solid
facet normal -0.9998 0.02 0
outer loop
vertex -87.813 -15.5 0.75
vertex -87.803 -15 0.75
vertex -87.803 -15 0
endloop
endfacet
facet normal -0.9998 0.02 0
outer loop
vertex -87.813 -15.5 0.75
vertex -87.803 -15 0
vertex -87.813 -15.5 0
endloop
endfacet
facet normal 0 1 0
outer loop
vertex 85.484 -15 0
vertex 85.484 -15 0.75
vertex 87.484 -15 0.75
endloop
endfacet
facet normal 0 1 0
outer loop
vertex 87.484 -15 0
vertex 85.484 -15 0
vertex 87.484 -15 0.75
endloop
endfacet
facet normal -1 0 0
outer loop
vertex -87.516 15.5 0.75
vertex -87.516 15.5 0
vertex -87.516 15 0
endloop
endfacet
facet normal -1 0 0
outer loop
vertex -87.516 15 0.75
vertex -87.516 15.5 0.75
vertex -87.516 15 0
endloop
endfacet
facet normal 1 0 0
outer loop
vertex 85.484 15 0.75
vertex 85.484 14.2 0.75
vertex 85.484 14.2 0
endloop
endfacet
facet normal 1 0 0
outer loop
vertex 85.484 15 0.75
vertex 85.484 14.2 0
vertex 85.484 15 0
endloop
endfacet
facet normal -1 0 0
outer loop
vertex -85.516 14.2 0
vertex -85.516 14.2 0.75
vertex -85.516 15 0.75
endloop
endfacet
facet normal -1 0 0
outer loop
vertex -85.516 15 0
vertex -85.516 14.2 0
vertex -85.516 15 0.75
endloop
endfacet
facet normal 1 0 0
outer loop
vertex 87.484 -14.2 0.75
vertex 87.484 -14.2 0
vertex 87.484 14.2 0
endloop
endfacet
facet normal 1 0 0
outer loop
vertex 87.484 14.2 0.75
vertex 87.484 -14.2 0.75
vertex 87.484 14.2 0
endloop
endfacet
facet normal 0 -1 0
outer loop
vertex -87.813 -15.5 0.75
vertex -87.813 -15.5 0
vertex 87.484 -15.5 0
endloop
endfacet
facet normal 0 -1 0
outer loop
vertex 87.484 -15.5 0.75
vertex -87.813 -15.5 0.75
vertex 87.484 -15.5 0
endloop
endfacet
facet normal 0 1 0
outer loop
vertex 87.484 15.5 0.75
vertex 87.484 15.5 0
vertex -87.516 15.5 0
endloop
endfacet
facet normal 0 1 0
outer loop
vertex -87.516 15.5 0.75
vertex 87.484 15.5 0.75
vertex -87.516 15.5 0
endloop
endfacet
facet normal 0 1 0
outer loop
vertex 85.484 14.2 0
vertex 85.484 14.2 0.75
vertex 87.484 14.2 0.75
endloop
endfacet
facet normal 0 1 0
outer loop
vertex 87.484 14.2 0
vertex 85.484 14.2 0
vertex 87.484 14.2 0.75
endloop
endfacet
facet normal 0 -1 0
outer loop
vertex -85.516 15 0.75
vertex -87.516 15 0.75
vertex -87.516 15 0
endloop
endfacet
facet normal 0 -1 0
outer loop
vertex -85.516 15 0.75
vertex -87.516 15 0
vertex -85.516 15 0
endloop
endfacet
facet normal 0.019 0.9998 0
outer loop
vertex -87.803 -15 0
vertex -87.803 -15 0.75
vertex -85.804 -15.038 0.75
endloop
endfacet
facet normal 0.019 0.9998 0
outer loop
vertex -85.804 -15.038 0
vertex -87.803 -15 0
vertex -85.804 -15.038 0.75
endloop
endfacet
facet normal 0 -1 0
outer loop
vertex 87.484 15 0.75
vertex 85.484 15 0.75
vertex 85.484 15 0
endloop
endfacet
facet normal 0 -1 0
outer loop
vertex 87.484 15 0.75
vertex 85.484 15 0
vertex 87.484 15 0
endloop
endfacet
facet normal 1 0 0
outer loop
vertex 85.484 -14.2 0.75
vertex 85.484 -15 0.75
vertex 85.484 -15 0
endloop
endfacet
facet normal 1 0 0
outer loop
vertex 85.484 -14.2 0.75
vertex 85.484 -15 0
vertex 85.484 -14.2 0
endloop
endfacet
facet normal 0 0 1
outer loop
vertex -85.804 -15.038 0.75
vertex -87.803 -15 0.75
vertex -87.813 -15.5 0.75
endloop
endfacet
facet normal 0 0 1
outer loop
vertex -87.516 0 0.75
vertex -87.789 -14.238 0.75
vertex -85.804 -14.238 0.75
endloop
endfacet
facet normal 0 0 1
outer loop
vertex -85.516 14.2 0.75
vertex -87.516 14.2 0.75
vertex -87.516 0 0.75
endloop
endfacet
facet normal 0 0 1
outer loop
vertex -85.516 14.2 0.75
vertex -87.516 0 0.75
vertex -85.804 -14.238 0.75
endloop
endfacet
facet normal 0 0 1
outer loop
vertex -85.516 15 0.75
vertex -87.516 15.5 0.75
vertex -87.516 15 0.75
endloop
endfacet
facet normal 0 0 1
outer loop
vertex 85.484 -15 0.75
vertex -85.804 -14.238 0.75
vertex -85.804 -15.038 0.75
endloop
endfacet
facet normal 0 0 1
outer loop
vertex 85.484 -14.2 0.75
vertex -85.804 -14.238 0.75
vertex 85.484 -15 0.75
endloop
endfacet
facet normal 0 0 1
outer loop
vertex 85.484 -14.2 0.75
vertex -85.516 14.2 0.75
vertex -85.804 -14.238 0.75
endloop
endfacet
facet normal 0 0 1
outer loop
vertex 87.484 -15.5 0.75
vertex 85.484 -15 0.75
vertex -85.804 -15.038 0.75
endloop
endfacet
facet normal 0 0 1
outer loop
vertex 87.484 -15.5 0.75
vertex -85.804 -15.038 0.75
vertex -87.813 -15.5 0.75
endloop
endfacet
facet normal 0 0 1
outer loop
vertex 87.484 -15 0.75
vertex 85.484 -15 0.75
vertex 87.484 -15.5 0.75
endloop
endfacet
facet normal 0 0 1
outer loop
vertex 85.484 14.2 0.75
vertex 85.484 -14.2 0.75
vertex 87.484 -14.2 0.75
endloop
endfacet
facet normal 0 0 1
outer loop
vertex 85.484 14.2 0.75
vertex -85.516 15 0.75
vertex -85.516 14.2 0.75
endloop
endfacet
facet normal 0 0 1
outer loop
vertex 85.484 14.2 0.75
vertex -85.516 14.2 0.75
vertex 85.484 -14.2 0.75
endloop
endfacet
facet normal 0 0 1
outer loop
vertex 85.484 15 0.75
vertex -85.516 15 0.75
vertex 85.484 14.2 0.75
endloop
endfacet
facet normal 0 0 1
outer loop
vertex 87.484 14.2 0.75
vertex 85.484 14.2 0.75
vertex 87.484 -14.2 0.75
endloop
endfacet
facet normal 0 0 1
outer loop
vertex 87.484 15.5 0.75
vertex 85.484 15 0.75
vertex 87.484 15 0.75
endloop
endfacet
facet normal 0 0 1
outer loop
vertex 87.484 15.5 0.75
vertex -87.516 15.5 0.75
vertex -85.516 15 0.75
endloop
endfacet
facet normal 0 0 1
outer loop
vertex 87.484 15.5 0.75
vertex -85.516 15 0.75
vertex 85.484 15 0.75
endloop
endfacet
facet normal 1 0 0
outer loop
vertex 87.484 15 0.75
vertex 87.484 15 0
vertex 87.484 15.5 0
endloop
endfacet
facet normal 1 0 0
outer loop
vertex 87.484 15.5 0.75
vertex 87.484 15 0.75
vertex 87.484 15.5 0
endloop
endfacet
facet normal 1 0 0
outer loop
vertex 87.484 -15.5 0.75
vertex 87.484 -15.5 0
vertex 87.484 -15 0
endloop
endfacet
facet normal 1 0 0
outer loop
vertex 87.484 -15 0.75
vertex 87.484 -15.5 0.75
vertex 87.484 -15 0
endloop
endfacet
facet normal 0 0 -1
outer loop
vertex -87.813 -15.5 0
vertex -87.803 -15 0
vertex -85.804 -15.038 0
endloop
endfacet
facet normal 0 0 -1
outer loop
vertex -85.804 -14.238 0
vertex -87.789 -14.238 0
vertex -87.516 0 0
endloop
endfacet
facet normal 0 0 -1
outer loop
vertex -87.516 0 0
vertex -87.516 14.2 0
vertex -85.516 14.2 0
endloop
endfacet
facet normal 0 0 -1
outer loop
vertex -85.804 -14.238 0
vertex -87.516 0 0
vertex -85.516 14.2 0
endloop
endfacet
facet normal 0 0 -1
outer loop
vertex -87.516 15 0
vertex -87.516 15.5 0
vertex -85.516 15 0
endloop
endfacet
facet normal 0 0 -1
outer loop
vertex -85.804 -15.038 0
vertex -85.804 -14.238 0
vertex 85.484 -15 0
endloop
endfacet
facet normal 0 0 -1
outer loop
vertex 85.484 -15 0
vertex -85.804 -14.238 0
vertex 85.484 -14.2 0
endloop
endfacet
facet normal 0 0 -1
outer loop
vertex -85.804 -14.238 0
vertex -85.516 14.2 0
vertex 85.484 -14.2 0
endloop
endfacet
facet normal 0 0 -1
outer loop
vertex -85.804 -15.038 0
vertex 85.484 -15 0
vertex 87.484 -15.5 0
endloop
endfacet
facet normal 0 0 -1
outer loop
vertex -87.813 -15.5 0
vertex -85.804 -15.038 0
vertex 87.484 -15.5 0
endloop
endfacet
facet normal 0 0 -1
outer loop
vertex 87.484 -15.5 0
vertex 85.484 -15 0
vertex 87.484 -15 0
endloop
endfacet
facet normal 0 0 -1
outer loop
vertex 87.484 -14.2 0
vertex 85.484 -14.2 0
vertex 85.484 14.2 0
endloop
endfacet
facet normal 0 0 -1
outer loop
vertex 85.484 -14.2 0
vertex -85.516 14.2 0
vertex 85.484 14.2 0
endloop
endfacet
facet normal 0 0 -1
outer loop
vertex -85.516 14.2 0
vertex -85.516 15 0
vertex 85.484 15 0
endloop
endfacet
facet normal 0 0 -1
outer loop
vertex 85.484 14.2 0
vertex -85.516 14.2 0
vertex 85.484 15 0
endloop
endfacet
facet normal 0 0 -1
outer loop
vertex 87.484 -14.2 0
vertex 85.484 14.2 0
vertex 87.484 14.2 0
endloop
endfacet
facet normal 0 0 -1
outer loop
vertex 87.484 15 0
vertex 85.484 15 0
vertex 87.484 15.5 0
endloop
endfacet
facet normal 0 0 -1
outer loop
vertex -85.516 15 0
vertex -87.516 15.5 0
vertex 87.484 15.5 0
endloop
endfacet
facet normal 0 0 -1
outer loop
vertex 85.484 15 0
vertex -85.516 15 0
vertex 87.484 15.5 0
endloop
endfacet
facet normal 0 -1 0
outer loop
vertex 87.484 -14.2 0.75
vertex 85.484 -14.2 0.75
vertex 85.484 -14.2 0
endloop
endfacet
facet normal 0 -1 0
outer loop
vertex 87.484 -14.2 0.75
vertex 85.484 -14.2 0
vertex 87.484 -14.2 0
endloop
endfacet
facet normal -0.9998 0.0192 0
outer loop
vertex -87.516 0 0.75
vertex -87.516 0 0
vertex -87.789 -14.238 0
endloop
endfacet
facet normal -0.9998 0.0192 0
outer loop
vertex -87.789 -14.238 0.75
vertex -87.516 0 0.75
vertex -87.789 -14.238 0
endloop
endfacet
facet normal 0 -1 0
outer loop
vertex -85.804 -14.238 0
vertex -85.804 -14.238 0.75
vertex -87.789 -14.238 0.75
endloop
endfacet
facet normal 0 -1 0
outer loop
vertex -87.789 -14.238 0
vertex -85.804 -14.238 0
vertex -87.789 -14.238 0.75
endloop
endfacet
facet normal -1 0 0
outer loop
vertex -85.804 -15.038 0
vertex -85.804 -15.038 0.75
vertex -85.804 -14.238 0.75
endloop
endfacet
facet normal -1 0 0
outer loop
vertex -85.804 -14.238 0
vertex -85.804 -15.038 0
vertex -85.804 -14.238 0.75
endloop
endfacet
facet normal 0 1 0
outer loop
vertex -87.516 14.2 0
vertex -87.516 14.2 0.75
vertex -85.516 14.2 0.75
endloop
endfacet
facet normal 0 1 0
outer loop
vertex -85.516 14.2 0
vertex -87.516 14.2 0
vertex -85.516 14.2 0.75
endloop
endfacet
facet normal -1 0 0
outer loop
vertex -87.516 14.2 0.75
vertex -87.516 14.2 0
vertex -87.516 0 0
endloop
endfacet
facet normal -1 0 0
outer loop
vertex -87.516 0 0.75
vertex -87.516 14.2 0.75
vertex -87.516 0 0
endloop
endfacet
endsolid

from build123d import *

# Parameters (mm, degrees)
F1_DEPTH = 0.75
F3_DEPTH = 0.75
F4_W     = 2
F4_H     = 0.8
F5_DEPTH = 25
F6_W     = 2
F6_H     = 0.8
F7_DEPTH = 0.751
F8_W     = 2
F8_H     = 0.8
F9_DEPTH = 0.751


with BuildPart() as f1:
    # F0 (on Top) → F1 (new body)
    with BuildSketch(Plane.XY):
        Polygon((-87.5160314443, 15.5), (-87.5160314443, 0), (-87.8127528557, -15.5), (87.4839685557, -15.5), (87.4839685557, 15.5), align=None)
    extrude(amount=F1_DEPTH)

    # F2 (on face) → F3 (cut, through all)
    with BuildSketch(Plane.XY.offset(0.75)):
        Polygon((-87.7885993427, -14.2382796203), (-87.8031811973, -15), (-85.8035475632, -15.0382796203), (-85.8035475632, -14.2382796203), align=None)
    extrude(amount=-F3_DEPTH, mode=Mode.SUBTRACT)

    # F4 (on face) → F5 (cut)
    with BuildSketch(Plane.XY.offset(0.75)):
        with Locations((-86.5160314443, 14.6)):
            Rectangle(F4_W, F4_H)
    extrude(amount=-F5_DEPTH, mode=Mode.SUBTRACT)

    # F6 (on face) → F7 (cut, through all)
    with BuildSketch(Plane.XY.offset(0.75)):
        with Locations((86.4839685557, 14.6)):
            Rectangle(F6_W, F6_H)
    extrude(amount=-F7_DEPTH, mode=Mode.SUBTRACT)

    # F8 (on face) → F9 (cut, through all)
    with BuildSketch(Plane.XY.offset(0.75)):
        with Locations((86.4839685557, -14.6)):
            Rectangle(F8_W, F8_H)
    extrude(amount=-F9_DEPTH, mode=Mode.SUBTRACT)


solid = f1.part
